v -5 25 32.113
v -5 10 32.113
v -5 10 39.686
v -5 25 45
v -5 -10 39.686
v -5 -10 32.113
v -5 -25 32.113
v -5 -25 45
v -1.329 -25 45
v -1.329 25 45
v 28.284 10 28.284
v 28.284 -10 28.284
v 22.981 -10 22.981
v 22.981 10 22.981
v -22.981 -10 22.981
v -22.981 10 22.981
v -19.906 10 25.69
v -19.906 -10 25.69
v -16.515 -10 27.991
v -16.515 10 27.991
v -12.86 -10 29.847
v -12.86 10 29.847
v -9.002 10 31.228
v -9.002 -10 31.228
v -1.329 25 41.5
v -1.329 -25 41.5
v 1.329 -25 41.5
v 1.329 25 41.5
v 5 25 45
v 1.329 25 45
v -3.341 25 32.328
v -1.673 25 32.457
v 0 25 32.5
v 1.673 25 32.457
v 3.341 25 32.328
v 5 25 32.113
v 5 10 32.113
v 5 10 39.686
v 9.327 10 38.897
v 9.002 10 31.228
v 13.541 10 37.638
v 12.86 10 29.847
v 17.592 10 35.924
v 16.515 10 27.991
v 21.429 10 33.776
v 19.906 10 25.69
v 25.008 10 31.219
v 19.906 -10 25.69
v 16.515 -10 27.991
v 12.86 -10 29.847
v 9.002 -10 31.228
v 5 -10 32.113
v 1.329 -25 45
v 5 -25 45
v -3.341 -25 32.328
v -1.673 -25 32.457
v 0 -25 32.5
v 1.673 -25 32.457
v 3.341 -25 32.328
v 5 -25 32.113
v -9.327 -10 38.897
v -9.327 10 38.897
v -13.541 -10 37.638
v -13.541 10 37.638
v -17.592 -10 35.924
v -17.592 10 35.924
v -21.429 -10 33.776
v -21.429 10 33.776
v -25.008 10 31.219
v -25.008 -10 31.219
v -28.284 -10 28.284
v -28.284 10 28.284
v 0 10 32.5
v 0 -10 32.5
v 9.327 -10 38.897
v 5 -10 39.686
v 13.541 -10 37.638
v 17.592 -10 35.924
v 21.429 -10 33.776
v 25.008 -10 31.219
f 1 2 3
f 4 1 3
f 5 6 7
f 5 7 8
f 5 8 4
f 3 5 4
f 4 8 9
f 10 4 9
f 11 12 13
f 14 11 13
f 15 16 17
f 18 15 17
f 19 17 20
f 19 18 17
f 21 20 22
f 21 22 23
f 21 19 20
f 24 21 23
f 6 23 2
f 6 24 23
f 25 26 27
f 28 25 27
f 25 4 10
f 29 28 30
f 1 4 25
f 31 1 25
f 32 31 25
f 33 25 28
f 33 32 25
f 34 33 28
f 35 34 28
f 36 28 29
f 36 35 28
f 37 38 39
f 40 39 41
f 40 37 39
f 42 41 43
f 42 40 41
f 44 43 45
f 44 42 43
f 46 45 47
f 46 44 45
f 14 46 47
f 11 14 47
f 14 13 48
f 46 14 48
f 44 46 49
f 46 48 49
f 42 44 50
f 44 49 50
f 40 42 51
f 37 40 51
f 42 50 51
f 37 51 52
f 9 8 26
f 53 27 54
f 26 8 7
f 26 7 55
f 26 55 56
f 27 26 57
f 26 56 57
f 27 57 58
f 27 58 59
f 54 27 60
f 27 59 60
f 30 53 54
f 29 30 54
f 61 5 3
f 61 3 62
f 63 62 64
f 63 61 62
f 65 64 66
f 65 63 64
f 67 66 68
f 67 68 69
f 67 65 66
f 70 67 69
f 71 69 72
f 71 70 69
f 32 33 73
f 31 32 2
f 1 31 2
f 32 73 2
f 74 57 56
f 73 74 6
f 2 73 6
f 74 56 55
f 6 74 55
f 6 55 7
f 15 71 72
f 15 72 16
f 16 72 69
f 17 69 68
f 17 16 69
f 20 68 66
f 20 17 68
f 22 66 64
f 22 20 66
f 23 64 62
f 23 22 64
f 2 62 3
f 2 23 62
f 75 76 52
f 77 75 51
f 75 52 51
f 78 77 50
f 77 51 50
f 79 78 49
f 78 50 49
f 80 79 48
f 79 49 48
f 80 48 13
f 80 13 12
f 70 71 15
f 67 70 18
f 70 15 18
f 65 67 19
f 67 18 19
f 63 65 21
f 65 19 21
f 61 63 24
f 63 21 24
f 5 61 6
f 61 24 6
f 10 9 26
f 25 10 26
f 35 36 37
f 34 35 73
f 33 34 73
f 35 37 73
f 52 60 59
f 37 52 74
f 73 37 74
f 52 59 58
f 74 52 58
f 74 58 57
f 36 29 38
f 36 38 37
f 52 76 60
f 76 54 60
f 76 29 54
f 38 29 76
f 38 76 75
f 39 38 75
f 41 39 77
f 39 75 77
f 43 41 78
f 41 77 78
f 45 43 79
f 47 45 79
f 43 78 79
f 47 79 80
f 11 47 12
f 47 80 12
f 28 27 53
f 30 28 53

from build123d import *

# Parameters (mm, degrees)
BOSS_EXTRUDE1_DEPTH      = 10
BOSS_EXTRUDE1_DEPTH_BACK = 10
BOSS_EXTRUDE2_DEPTH      = 25
BOSS_EXTRUDE2_DEPTH_BACK = 25


with BuildPart() as part:
    # Sketch1 → Boss-Extrude1 (new, two sides: drawn at the far end of the back side and taken through both)
    with BuildSketch(Plane(origin=(0, 0, 0), x_dir=(1, 0, 0), z_dir=(0, 1, 0)).offset(-BOSS_EXTRUDE1_DEPTH_BACK)):
        with BuildLine():
            Line((28.284273238, -28.284269257), (22.980972379, -22.980968398))
            ThreePointArc((22.980972379, -22.980968398), (1.407e-06, -32.5), (-22.980970389, -22.980970389))
            Line((-22.980970389, -22.980970389), (-28.284271247, -28.284271247))
            ThreePointArc((-28.284271247, -28.284271247), (1.407e-06, -40), (28.284273238, -28.284269257))
        make_face()
    extrude(amount=BOSS_EXTRUDE1_DEPTH + BOSS_EXTRUDE1_DEPTH_BACK)

    # Sketch2 → Boss-Extrude2 (add, two sides: drawn at the far end of the back side and taken through both)
    with BuildSketch(Plane(origin=(0, 0, 0), x_dir=(1, 0, 0), z_dir=(0, 1, 0)).offset(-BOSS_EXTRUDE2_DEPTH_BACK)):
        with BuildLine():
            Line((1.328609333, -41.5), (1.328609333, -45))
            Line((1.328609333, -45), (5, -45))
            Line((5, -45), (5, -32.113081447))
            ThreePointArc((5, -32.113081447), (0, -32.5), (-5, -32.113081447))
            Line((-5, -32.113081447), (-5, -45))
            Line((-5, -45), (-1.328609333, -45))
            Line((-1.328609333, -45), (-1.328609333, -41.5))
            Line((-1.328609333, -41.5), (1.328609333, -41.5))
        make_face()
    extrude(amount=BOSS_EXTRUDE2_DEPTH + BOSS_EXTRUDE2_DEPTH_BACK)


solid = part.part
